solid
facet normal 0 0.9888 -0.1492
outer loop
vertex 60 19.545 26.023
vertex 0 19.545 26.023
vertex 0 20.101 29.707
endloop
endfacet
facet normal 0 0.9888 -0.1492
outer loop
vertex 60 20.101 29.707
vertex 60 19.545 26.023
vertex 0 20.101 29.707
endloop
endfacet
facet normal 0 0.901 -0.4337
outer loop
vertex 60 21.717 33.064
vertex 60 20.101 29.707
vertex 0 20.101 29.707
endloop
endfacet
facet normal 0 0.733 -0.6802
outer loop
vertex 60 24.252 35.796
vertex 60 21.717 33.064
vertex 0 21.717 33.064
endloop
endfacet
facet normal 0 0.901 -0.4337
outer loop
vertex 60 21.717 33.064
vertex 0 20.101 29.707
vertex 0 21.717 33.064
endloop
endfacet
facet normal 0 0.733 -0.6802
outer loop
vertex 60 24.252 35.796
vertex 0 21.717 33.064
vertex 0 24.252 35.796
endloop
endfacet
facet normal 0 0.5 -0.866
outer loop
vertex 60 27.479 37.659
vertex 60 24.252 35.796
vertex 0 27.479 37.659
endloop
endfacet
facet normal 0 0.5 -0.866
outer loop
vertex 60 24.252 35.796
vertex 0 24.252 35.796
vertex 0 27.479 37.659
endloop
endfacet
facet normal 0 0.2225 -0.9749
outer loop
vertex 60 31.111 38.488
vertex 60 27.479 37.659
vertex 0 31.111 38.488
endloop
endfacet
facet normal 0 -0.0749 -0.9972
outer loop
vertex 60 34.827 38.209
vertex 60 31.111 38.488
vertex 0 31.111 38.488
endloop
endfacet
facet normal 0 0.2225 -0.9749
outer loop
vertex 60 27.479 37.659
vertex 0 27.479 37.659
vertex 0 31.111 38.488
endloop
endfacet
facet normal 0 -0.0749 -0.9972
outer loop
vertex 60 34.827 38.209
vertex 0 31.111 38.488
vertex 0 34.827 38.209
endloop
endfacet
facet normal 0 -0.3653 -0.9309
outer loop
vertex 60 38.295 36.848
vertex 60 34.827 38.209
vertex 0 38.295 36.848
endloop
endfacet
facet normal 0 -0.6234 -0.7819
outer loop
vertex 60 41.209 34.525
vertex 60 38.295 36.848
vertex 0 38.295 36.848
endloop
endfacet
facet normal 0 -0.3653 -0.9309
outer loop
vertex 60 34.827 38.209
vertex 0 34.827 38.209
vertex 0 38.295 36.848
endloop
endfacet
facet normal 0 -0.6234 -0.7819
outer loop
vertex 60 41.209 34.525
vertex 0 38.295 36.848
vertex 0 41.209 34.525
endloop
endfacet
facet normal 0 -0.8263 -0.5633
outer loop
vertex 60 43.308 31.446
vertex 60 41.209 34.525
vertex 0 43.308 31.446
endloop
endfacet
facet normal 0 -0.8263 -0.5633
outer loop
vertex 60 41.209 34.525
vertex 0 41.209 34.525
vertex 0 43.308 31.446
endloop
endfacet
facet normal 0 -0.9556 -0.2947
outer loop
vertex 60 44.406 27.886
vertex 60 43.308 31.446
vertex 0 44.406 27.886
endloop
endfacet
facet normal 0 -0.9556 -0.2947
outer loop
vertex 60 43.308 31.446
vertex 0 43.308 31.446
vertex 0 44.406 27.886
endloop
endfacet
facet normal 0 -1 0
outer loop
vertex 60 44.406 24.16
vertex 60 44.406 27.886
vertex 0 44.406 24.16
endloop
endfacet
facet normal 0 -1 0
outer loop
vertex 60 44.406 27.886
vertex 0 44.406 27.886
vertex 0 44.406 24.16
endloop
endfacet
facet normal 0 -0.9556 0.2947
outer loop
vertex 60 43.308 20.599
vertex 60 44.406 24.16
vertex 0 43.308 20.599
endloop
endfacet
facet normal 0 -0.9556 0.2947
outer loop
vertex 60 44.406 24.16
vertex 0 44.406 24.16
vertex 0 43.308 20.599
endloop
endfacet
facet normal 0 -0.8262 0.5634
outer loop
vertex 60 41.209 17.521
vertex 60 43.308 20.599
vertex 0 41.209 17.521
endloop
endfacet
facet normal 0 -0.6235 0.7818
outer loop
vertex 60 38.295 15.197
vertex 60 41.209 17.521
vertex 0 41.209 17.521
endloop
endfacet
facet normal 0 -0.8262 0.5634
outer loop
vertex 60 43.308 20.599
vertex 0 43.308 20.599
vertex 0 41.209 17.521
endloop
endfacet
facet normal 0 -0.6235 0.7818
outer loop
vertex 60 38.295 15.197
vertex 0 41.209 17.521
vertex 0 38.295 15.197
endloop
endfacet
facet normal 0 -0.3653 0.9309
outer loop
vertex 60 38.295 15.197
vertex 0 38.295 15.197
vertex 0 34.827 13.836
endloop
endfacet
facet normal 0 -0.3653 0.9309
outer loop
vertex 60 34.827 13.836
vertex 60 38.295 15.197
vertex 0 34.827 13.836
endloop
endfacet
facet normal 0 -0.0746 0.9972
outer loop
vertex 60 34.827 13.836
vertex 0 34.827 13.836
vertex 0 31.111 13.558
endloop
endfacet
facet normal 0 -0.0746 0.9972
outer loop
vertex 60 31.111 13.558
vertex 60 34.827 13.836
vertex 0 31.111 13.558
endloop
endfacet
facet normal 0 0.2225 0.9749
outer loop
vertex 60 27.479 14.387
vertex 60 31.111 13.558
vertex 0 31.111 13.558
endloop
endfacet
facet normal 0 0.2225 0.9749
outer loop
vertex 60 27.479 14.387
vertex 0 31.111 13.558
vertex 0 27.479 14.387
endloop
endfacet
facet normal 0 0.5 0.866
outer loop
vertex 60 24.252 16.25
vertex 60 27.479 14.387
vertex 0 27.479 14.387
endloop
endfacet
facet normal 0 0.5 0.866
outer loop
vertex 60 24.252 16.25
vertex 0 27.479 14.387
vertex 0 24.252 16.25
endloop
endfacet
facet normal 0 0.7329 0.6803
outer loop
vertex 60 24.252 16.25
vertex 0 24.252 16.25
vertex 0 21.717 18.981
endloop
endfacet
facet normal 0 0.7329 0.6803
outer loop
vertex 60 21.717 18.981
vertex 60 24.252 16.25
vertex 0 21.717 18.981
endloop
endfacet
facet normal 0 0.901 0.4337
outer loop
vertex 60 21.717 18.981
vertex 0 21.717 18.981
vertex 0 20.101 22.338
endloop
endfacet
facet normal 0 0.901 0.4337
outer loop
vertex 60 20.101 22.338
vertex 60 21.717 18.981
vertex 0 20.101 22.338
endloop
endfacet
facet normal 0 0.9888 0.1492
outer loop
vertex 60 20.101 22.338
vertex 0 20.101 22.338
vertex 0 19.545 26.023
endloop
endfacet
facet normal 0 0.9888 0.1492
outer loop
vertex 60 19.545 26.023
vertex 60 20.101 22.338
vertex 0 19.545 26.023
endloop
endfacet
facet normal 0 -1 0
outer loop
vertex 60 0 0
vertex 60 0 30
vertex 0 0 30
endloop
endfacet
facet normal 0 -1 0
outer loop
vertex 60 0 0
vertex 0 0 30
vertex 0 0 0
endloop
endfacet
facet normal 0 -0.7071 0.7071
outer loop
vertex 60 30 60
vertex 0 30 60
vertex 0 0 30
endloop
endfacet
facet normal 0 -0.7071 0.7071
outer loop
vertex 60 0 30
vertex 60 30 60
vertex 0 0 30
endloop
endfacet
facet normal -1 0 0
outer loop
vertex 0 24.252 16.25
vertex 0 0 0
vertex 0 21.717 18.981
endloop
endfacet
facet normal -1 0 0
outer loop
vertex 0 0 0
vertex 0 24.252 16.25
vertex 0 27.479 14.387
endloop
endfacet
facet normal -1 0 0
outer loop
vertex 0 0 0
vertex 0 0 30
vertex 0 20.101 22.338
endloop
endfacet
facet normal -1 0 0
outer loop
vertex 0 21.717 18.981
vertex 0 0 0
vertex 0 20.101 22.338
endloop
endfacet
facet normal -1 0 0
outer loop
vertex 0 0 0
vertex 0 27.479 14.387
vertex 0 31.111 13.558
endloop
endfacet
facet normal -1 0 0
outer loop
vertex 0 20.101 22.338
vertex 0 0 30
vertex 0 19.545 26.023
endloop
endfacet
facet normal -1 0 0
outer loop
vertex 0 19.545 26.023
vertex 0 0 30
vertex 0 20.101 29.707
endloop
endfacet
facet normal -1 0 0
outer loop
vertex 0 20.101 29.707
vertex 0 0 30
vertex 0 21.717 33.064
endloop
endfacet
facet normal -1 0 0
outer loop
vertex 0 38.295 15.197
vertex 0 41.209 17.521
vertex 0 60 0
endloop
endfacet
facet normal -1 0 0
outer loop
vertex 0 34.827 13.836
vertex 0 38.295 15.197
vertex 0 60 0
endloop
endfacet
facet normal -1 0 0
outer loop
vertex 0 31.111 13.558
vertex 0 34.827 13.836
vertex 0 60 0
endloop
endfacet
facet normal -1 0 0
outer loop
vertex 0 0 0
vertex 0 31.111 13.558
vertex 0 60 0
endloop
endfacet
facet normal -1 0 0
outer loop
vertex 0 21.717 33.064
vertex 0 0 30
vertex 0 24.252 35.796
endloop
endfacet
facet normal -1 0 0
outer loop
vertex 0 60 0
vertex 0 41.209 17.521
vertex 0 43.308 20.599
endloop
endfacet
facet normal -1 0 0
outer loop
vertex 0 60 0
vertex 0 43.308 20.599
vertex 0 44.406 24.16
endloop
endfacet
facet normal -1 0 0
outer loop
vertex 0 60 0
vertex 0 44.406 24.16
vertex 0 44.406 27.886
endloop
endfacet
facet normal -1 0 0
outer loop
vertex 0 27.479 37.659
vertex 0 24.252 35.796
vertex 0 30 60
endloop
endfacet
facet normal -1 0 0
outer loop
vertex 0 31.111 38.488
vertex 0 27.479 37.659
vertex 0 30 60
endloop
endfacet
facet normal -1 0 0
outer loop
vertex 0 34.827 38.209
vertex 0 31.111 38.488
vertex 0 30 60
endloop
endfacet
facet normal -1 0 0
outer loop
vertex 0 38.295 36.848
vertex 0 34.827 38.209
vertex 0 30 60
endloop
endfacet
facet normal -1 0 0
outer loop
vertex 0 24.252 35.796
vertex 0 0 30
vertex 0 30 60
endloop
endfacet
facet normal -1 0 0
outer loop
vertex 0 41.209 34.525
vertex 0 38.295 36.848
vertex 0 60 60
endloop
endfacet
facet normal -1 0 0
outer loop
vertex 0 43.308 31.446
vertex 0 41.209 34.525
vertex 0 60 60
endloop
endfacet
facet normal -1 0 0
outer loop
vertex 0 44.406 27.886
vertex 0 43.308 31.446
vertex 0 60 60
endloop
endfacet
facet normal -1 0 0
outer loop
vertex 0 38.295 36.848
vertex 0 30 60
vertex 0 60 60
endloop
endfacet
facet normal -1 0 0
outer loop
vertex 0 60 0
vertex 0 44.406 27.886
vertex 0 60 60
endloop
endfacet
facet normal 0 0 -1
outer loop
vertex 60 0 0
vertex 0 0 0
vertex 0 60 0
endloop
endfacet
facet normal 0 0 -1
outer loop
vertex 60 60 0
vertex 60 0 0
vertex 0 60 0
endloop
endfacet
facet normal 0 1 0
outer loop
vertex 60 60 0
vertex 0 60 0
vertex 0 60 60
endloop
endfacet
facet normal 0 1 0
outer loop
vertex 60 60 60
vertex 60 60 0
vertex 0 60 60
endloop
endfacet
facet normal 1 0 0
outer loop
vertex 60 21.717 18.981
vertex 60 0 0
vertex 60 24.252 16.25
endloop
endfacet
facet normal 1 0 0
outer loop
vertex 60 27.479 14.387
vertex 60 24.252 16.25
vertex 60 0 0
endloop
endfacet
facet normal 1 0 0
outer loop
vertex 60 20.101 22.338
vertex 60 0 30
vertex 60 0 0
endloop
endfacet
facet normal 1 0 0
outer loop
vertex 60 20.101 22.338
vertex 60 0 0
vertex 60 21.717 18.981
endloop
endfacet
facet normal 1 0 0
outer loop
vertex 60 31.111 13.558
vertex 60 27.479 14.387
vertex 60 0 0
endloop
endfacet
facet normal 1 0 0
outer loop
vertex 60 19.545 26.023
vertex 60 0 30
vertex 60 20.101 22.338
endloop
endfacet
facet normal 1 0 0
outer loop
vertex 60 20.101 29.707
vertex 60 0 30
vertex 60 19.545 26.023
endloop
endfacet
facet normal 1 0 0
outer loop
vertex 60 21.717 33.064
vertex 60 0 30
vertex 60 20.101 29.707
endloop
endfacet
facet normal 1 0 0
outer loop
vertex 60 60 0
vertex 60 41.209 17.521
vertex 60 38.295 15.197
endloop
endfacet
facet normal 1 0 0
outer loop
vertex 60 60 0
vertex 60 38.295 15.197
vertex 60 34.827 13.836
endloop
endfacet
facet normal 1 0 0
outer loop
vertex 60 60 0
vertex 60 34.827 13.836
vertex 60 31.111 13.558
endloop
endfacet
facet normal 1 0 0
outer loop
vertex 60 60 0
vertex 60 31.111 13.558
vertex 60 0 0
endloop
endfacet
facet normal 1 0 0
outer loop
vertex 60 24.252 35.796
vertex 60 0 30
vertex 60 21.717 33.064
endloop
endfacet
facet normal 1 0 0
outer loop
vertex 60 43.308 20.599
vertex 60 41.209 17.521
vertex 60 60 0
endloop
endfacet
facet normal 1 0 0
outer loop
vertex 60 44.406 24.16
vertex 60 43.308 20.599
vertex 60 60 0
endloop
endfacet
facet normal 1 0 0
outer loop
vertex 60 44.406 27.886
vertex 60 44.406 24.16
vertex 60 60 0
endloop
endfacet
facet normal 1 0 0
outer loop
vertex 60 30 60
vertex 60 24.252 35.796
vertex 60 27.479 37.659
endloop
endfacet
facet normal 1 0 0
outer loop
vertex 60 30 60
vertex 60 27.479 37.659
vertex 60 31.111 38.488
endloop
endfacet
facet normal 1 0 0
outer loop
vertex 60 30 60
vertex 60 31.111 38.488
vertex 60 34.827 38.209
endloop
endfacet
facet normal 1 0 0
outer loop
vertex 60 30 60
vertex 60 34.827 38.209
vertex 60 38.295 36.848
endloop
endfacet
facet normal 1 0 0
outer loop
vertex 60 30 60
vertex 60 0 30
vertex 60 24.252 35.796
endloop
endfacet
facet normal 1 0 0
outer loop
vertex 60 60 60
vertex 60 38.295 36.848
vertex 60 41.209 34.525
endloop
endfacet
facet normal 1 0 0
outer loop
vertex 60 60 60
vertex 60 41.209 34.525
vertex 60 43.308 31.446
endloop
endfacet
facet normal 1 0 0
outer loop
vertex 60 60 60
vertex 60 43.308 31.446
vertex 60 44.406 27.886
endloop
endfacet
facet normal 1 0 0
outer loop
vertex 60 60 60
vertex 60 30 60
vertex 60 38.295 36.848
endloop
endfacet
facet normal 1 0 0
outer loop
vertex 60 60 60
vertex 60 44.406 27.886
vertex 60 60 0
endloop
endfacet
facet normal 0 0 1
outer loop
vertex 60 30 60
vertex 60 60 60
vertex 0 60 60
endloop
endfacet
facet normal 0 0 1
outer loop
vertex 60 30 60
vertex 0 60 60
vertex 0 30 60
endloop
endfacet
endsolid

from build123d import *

# Parameters (mm, degrees)
F1_DEPTH = 60
F3_D     = 25


with BuildPart() as f1:
    # F0 (on Right) → F1 (new body)
    with BuildSketch(Plane.YZ):
        Polygon((0, 30), (0, 0), (60, 0), (60, 60), (30, 60), align=None)
    extrude(amount=F1_DEPTH)

    # F3 (through all)
    with Locations(Plane.YZ.offset(60)):
        with Locations((32.045458, 26.022727)):
            Hole(F3_D / 2)


solid = f1.part
